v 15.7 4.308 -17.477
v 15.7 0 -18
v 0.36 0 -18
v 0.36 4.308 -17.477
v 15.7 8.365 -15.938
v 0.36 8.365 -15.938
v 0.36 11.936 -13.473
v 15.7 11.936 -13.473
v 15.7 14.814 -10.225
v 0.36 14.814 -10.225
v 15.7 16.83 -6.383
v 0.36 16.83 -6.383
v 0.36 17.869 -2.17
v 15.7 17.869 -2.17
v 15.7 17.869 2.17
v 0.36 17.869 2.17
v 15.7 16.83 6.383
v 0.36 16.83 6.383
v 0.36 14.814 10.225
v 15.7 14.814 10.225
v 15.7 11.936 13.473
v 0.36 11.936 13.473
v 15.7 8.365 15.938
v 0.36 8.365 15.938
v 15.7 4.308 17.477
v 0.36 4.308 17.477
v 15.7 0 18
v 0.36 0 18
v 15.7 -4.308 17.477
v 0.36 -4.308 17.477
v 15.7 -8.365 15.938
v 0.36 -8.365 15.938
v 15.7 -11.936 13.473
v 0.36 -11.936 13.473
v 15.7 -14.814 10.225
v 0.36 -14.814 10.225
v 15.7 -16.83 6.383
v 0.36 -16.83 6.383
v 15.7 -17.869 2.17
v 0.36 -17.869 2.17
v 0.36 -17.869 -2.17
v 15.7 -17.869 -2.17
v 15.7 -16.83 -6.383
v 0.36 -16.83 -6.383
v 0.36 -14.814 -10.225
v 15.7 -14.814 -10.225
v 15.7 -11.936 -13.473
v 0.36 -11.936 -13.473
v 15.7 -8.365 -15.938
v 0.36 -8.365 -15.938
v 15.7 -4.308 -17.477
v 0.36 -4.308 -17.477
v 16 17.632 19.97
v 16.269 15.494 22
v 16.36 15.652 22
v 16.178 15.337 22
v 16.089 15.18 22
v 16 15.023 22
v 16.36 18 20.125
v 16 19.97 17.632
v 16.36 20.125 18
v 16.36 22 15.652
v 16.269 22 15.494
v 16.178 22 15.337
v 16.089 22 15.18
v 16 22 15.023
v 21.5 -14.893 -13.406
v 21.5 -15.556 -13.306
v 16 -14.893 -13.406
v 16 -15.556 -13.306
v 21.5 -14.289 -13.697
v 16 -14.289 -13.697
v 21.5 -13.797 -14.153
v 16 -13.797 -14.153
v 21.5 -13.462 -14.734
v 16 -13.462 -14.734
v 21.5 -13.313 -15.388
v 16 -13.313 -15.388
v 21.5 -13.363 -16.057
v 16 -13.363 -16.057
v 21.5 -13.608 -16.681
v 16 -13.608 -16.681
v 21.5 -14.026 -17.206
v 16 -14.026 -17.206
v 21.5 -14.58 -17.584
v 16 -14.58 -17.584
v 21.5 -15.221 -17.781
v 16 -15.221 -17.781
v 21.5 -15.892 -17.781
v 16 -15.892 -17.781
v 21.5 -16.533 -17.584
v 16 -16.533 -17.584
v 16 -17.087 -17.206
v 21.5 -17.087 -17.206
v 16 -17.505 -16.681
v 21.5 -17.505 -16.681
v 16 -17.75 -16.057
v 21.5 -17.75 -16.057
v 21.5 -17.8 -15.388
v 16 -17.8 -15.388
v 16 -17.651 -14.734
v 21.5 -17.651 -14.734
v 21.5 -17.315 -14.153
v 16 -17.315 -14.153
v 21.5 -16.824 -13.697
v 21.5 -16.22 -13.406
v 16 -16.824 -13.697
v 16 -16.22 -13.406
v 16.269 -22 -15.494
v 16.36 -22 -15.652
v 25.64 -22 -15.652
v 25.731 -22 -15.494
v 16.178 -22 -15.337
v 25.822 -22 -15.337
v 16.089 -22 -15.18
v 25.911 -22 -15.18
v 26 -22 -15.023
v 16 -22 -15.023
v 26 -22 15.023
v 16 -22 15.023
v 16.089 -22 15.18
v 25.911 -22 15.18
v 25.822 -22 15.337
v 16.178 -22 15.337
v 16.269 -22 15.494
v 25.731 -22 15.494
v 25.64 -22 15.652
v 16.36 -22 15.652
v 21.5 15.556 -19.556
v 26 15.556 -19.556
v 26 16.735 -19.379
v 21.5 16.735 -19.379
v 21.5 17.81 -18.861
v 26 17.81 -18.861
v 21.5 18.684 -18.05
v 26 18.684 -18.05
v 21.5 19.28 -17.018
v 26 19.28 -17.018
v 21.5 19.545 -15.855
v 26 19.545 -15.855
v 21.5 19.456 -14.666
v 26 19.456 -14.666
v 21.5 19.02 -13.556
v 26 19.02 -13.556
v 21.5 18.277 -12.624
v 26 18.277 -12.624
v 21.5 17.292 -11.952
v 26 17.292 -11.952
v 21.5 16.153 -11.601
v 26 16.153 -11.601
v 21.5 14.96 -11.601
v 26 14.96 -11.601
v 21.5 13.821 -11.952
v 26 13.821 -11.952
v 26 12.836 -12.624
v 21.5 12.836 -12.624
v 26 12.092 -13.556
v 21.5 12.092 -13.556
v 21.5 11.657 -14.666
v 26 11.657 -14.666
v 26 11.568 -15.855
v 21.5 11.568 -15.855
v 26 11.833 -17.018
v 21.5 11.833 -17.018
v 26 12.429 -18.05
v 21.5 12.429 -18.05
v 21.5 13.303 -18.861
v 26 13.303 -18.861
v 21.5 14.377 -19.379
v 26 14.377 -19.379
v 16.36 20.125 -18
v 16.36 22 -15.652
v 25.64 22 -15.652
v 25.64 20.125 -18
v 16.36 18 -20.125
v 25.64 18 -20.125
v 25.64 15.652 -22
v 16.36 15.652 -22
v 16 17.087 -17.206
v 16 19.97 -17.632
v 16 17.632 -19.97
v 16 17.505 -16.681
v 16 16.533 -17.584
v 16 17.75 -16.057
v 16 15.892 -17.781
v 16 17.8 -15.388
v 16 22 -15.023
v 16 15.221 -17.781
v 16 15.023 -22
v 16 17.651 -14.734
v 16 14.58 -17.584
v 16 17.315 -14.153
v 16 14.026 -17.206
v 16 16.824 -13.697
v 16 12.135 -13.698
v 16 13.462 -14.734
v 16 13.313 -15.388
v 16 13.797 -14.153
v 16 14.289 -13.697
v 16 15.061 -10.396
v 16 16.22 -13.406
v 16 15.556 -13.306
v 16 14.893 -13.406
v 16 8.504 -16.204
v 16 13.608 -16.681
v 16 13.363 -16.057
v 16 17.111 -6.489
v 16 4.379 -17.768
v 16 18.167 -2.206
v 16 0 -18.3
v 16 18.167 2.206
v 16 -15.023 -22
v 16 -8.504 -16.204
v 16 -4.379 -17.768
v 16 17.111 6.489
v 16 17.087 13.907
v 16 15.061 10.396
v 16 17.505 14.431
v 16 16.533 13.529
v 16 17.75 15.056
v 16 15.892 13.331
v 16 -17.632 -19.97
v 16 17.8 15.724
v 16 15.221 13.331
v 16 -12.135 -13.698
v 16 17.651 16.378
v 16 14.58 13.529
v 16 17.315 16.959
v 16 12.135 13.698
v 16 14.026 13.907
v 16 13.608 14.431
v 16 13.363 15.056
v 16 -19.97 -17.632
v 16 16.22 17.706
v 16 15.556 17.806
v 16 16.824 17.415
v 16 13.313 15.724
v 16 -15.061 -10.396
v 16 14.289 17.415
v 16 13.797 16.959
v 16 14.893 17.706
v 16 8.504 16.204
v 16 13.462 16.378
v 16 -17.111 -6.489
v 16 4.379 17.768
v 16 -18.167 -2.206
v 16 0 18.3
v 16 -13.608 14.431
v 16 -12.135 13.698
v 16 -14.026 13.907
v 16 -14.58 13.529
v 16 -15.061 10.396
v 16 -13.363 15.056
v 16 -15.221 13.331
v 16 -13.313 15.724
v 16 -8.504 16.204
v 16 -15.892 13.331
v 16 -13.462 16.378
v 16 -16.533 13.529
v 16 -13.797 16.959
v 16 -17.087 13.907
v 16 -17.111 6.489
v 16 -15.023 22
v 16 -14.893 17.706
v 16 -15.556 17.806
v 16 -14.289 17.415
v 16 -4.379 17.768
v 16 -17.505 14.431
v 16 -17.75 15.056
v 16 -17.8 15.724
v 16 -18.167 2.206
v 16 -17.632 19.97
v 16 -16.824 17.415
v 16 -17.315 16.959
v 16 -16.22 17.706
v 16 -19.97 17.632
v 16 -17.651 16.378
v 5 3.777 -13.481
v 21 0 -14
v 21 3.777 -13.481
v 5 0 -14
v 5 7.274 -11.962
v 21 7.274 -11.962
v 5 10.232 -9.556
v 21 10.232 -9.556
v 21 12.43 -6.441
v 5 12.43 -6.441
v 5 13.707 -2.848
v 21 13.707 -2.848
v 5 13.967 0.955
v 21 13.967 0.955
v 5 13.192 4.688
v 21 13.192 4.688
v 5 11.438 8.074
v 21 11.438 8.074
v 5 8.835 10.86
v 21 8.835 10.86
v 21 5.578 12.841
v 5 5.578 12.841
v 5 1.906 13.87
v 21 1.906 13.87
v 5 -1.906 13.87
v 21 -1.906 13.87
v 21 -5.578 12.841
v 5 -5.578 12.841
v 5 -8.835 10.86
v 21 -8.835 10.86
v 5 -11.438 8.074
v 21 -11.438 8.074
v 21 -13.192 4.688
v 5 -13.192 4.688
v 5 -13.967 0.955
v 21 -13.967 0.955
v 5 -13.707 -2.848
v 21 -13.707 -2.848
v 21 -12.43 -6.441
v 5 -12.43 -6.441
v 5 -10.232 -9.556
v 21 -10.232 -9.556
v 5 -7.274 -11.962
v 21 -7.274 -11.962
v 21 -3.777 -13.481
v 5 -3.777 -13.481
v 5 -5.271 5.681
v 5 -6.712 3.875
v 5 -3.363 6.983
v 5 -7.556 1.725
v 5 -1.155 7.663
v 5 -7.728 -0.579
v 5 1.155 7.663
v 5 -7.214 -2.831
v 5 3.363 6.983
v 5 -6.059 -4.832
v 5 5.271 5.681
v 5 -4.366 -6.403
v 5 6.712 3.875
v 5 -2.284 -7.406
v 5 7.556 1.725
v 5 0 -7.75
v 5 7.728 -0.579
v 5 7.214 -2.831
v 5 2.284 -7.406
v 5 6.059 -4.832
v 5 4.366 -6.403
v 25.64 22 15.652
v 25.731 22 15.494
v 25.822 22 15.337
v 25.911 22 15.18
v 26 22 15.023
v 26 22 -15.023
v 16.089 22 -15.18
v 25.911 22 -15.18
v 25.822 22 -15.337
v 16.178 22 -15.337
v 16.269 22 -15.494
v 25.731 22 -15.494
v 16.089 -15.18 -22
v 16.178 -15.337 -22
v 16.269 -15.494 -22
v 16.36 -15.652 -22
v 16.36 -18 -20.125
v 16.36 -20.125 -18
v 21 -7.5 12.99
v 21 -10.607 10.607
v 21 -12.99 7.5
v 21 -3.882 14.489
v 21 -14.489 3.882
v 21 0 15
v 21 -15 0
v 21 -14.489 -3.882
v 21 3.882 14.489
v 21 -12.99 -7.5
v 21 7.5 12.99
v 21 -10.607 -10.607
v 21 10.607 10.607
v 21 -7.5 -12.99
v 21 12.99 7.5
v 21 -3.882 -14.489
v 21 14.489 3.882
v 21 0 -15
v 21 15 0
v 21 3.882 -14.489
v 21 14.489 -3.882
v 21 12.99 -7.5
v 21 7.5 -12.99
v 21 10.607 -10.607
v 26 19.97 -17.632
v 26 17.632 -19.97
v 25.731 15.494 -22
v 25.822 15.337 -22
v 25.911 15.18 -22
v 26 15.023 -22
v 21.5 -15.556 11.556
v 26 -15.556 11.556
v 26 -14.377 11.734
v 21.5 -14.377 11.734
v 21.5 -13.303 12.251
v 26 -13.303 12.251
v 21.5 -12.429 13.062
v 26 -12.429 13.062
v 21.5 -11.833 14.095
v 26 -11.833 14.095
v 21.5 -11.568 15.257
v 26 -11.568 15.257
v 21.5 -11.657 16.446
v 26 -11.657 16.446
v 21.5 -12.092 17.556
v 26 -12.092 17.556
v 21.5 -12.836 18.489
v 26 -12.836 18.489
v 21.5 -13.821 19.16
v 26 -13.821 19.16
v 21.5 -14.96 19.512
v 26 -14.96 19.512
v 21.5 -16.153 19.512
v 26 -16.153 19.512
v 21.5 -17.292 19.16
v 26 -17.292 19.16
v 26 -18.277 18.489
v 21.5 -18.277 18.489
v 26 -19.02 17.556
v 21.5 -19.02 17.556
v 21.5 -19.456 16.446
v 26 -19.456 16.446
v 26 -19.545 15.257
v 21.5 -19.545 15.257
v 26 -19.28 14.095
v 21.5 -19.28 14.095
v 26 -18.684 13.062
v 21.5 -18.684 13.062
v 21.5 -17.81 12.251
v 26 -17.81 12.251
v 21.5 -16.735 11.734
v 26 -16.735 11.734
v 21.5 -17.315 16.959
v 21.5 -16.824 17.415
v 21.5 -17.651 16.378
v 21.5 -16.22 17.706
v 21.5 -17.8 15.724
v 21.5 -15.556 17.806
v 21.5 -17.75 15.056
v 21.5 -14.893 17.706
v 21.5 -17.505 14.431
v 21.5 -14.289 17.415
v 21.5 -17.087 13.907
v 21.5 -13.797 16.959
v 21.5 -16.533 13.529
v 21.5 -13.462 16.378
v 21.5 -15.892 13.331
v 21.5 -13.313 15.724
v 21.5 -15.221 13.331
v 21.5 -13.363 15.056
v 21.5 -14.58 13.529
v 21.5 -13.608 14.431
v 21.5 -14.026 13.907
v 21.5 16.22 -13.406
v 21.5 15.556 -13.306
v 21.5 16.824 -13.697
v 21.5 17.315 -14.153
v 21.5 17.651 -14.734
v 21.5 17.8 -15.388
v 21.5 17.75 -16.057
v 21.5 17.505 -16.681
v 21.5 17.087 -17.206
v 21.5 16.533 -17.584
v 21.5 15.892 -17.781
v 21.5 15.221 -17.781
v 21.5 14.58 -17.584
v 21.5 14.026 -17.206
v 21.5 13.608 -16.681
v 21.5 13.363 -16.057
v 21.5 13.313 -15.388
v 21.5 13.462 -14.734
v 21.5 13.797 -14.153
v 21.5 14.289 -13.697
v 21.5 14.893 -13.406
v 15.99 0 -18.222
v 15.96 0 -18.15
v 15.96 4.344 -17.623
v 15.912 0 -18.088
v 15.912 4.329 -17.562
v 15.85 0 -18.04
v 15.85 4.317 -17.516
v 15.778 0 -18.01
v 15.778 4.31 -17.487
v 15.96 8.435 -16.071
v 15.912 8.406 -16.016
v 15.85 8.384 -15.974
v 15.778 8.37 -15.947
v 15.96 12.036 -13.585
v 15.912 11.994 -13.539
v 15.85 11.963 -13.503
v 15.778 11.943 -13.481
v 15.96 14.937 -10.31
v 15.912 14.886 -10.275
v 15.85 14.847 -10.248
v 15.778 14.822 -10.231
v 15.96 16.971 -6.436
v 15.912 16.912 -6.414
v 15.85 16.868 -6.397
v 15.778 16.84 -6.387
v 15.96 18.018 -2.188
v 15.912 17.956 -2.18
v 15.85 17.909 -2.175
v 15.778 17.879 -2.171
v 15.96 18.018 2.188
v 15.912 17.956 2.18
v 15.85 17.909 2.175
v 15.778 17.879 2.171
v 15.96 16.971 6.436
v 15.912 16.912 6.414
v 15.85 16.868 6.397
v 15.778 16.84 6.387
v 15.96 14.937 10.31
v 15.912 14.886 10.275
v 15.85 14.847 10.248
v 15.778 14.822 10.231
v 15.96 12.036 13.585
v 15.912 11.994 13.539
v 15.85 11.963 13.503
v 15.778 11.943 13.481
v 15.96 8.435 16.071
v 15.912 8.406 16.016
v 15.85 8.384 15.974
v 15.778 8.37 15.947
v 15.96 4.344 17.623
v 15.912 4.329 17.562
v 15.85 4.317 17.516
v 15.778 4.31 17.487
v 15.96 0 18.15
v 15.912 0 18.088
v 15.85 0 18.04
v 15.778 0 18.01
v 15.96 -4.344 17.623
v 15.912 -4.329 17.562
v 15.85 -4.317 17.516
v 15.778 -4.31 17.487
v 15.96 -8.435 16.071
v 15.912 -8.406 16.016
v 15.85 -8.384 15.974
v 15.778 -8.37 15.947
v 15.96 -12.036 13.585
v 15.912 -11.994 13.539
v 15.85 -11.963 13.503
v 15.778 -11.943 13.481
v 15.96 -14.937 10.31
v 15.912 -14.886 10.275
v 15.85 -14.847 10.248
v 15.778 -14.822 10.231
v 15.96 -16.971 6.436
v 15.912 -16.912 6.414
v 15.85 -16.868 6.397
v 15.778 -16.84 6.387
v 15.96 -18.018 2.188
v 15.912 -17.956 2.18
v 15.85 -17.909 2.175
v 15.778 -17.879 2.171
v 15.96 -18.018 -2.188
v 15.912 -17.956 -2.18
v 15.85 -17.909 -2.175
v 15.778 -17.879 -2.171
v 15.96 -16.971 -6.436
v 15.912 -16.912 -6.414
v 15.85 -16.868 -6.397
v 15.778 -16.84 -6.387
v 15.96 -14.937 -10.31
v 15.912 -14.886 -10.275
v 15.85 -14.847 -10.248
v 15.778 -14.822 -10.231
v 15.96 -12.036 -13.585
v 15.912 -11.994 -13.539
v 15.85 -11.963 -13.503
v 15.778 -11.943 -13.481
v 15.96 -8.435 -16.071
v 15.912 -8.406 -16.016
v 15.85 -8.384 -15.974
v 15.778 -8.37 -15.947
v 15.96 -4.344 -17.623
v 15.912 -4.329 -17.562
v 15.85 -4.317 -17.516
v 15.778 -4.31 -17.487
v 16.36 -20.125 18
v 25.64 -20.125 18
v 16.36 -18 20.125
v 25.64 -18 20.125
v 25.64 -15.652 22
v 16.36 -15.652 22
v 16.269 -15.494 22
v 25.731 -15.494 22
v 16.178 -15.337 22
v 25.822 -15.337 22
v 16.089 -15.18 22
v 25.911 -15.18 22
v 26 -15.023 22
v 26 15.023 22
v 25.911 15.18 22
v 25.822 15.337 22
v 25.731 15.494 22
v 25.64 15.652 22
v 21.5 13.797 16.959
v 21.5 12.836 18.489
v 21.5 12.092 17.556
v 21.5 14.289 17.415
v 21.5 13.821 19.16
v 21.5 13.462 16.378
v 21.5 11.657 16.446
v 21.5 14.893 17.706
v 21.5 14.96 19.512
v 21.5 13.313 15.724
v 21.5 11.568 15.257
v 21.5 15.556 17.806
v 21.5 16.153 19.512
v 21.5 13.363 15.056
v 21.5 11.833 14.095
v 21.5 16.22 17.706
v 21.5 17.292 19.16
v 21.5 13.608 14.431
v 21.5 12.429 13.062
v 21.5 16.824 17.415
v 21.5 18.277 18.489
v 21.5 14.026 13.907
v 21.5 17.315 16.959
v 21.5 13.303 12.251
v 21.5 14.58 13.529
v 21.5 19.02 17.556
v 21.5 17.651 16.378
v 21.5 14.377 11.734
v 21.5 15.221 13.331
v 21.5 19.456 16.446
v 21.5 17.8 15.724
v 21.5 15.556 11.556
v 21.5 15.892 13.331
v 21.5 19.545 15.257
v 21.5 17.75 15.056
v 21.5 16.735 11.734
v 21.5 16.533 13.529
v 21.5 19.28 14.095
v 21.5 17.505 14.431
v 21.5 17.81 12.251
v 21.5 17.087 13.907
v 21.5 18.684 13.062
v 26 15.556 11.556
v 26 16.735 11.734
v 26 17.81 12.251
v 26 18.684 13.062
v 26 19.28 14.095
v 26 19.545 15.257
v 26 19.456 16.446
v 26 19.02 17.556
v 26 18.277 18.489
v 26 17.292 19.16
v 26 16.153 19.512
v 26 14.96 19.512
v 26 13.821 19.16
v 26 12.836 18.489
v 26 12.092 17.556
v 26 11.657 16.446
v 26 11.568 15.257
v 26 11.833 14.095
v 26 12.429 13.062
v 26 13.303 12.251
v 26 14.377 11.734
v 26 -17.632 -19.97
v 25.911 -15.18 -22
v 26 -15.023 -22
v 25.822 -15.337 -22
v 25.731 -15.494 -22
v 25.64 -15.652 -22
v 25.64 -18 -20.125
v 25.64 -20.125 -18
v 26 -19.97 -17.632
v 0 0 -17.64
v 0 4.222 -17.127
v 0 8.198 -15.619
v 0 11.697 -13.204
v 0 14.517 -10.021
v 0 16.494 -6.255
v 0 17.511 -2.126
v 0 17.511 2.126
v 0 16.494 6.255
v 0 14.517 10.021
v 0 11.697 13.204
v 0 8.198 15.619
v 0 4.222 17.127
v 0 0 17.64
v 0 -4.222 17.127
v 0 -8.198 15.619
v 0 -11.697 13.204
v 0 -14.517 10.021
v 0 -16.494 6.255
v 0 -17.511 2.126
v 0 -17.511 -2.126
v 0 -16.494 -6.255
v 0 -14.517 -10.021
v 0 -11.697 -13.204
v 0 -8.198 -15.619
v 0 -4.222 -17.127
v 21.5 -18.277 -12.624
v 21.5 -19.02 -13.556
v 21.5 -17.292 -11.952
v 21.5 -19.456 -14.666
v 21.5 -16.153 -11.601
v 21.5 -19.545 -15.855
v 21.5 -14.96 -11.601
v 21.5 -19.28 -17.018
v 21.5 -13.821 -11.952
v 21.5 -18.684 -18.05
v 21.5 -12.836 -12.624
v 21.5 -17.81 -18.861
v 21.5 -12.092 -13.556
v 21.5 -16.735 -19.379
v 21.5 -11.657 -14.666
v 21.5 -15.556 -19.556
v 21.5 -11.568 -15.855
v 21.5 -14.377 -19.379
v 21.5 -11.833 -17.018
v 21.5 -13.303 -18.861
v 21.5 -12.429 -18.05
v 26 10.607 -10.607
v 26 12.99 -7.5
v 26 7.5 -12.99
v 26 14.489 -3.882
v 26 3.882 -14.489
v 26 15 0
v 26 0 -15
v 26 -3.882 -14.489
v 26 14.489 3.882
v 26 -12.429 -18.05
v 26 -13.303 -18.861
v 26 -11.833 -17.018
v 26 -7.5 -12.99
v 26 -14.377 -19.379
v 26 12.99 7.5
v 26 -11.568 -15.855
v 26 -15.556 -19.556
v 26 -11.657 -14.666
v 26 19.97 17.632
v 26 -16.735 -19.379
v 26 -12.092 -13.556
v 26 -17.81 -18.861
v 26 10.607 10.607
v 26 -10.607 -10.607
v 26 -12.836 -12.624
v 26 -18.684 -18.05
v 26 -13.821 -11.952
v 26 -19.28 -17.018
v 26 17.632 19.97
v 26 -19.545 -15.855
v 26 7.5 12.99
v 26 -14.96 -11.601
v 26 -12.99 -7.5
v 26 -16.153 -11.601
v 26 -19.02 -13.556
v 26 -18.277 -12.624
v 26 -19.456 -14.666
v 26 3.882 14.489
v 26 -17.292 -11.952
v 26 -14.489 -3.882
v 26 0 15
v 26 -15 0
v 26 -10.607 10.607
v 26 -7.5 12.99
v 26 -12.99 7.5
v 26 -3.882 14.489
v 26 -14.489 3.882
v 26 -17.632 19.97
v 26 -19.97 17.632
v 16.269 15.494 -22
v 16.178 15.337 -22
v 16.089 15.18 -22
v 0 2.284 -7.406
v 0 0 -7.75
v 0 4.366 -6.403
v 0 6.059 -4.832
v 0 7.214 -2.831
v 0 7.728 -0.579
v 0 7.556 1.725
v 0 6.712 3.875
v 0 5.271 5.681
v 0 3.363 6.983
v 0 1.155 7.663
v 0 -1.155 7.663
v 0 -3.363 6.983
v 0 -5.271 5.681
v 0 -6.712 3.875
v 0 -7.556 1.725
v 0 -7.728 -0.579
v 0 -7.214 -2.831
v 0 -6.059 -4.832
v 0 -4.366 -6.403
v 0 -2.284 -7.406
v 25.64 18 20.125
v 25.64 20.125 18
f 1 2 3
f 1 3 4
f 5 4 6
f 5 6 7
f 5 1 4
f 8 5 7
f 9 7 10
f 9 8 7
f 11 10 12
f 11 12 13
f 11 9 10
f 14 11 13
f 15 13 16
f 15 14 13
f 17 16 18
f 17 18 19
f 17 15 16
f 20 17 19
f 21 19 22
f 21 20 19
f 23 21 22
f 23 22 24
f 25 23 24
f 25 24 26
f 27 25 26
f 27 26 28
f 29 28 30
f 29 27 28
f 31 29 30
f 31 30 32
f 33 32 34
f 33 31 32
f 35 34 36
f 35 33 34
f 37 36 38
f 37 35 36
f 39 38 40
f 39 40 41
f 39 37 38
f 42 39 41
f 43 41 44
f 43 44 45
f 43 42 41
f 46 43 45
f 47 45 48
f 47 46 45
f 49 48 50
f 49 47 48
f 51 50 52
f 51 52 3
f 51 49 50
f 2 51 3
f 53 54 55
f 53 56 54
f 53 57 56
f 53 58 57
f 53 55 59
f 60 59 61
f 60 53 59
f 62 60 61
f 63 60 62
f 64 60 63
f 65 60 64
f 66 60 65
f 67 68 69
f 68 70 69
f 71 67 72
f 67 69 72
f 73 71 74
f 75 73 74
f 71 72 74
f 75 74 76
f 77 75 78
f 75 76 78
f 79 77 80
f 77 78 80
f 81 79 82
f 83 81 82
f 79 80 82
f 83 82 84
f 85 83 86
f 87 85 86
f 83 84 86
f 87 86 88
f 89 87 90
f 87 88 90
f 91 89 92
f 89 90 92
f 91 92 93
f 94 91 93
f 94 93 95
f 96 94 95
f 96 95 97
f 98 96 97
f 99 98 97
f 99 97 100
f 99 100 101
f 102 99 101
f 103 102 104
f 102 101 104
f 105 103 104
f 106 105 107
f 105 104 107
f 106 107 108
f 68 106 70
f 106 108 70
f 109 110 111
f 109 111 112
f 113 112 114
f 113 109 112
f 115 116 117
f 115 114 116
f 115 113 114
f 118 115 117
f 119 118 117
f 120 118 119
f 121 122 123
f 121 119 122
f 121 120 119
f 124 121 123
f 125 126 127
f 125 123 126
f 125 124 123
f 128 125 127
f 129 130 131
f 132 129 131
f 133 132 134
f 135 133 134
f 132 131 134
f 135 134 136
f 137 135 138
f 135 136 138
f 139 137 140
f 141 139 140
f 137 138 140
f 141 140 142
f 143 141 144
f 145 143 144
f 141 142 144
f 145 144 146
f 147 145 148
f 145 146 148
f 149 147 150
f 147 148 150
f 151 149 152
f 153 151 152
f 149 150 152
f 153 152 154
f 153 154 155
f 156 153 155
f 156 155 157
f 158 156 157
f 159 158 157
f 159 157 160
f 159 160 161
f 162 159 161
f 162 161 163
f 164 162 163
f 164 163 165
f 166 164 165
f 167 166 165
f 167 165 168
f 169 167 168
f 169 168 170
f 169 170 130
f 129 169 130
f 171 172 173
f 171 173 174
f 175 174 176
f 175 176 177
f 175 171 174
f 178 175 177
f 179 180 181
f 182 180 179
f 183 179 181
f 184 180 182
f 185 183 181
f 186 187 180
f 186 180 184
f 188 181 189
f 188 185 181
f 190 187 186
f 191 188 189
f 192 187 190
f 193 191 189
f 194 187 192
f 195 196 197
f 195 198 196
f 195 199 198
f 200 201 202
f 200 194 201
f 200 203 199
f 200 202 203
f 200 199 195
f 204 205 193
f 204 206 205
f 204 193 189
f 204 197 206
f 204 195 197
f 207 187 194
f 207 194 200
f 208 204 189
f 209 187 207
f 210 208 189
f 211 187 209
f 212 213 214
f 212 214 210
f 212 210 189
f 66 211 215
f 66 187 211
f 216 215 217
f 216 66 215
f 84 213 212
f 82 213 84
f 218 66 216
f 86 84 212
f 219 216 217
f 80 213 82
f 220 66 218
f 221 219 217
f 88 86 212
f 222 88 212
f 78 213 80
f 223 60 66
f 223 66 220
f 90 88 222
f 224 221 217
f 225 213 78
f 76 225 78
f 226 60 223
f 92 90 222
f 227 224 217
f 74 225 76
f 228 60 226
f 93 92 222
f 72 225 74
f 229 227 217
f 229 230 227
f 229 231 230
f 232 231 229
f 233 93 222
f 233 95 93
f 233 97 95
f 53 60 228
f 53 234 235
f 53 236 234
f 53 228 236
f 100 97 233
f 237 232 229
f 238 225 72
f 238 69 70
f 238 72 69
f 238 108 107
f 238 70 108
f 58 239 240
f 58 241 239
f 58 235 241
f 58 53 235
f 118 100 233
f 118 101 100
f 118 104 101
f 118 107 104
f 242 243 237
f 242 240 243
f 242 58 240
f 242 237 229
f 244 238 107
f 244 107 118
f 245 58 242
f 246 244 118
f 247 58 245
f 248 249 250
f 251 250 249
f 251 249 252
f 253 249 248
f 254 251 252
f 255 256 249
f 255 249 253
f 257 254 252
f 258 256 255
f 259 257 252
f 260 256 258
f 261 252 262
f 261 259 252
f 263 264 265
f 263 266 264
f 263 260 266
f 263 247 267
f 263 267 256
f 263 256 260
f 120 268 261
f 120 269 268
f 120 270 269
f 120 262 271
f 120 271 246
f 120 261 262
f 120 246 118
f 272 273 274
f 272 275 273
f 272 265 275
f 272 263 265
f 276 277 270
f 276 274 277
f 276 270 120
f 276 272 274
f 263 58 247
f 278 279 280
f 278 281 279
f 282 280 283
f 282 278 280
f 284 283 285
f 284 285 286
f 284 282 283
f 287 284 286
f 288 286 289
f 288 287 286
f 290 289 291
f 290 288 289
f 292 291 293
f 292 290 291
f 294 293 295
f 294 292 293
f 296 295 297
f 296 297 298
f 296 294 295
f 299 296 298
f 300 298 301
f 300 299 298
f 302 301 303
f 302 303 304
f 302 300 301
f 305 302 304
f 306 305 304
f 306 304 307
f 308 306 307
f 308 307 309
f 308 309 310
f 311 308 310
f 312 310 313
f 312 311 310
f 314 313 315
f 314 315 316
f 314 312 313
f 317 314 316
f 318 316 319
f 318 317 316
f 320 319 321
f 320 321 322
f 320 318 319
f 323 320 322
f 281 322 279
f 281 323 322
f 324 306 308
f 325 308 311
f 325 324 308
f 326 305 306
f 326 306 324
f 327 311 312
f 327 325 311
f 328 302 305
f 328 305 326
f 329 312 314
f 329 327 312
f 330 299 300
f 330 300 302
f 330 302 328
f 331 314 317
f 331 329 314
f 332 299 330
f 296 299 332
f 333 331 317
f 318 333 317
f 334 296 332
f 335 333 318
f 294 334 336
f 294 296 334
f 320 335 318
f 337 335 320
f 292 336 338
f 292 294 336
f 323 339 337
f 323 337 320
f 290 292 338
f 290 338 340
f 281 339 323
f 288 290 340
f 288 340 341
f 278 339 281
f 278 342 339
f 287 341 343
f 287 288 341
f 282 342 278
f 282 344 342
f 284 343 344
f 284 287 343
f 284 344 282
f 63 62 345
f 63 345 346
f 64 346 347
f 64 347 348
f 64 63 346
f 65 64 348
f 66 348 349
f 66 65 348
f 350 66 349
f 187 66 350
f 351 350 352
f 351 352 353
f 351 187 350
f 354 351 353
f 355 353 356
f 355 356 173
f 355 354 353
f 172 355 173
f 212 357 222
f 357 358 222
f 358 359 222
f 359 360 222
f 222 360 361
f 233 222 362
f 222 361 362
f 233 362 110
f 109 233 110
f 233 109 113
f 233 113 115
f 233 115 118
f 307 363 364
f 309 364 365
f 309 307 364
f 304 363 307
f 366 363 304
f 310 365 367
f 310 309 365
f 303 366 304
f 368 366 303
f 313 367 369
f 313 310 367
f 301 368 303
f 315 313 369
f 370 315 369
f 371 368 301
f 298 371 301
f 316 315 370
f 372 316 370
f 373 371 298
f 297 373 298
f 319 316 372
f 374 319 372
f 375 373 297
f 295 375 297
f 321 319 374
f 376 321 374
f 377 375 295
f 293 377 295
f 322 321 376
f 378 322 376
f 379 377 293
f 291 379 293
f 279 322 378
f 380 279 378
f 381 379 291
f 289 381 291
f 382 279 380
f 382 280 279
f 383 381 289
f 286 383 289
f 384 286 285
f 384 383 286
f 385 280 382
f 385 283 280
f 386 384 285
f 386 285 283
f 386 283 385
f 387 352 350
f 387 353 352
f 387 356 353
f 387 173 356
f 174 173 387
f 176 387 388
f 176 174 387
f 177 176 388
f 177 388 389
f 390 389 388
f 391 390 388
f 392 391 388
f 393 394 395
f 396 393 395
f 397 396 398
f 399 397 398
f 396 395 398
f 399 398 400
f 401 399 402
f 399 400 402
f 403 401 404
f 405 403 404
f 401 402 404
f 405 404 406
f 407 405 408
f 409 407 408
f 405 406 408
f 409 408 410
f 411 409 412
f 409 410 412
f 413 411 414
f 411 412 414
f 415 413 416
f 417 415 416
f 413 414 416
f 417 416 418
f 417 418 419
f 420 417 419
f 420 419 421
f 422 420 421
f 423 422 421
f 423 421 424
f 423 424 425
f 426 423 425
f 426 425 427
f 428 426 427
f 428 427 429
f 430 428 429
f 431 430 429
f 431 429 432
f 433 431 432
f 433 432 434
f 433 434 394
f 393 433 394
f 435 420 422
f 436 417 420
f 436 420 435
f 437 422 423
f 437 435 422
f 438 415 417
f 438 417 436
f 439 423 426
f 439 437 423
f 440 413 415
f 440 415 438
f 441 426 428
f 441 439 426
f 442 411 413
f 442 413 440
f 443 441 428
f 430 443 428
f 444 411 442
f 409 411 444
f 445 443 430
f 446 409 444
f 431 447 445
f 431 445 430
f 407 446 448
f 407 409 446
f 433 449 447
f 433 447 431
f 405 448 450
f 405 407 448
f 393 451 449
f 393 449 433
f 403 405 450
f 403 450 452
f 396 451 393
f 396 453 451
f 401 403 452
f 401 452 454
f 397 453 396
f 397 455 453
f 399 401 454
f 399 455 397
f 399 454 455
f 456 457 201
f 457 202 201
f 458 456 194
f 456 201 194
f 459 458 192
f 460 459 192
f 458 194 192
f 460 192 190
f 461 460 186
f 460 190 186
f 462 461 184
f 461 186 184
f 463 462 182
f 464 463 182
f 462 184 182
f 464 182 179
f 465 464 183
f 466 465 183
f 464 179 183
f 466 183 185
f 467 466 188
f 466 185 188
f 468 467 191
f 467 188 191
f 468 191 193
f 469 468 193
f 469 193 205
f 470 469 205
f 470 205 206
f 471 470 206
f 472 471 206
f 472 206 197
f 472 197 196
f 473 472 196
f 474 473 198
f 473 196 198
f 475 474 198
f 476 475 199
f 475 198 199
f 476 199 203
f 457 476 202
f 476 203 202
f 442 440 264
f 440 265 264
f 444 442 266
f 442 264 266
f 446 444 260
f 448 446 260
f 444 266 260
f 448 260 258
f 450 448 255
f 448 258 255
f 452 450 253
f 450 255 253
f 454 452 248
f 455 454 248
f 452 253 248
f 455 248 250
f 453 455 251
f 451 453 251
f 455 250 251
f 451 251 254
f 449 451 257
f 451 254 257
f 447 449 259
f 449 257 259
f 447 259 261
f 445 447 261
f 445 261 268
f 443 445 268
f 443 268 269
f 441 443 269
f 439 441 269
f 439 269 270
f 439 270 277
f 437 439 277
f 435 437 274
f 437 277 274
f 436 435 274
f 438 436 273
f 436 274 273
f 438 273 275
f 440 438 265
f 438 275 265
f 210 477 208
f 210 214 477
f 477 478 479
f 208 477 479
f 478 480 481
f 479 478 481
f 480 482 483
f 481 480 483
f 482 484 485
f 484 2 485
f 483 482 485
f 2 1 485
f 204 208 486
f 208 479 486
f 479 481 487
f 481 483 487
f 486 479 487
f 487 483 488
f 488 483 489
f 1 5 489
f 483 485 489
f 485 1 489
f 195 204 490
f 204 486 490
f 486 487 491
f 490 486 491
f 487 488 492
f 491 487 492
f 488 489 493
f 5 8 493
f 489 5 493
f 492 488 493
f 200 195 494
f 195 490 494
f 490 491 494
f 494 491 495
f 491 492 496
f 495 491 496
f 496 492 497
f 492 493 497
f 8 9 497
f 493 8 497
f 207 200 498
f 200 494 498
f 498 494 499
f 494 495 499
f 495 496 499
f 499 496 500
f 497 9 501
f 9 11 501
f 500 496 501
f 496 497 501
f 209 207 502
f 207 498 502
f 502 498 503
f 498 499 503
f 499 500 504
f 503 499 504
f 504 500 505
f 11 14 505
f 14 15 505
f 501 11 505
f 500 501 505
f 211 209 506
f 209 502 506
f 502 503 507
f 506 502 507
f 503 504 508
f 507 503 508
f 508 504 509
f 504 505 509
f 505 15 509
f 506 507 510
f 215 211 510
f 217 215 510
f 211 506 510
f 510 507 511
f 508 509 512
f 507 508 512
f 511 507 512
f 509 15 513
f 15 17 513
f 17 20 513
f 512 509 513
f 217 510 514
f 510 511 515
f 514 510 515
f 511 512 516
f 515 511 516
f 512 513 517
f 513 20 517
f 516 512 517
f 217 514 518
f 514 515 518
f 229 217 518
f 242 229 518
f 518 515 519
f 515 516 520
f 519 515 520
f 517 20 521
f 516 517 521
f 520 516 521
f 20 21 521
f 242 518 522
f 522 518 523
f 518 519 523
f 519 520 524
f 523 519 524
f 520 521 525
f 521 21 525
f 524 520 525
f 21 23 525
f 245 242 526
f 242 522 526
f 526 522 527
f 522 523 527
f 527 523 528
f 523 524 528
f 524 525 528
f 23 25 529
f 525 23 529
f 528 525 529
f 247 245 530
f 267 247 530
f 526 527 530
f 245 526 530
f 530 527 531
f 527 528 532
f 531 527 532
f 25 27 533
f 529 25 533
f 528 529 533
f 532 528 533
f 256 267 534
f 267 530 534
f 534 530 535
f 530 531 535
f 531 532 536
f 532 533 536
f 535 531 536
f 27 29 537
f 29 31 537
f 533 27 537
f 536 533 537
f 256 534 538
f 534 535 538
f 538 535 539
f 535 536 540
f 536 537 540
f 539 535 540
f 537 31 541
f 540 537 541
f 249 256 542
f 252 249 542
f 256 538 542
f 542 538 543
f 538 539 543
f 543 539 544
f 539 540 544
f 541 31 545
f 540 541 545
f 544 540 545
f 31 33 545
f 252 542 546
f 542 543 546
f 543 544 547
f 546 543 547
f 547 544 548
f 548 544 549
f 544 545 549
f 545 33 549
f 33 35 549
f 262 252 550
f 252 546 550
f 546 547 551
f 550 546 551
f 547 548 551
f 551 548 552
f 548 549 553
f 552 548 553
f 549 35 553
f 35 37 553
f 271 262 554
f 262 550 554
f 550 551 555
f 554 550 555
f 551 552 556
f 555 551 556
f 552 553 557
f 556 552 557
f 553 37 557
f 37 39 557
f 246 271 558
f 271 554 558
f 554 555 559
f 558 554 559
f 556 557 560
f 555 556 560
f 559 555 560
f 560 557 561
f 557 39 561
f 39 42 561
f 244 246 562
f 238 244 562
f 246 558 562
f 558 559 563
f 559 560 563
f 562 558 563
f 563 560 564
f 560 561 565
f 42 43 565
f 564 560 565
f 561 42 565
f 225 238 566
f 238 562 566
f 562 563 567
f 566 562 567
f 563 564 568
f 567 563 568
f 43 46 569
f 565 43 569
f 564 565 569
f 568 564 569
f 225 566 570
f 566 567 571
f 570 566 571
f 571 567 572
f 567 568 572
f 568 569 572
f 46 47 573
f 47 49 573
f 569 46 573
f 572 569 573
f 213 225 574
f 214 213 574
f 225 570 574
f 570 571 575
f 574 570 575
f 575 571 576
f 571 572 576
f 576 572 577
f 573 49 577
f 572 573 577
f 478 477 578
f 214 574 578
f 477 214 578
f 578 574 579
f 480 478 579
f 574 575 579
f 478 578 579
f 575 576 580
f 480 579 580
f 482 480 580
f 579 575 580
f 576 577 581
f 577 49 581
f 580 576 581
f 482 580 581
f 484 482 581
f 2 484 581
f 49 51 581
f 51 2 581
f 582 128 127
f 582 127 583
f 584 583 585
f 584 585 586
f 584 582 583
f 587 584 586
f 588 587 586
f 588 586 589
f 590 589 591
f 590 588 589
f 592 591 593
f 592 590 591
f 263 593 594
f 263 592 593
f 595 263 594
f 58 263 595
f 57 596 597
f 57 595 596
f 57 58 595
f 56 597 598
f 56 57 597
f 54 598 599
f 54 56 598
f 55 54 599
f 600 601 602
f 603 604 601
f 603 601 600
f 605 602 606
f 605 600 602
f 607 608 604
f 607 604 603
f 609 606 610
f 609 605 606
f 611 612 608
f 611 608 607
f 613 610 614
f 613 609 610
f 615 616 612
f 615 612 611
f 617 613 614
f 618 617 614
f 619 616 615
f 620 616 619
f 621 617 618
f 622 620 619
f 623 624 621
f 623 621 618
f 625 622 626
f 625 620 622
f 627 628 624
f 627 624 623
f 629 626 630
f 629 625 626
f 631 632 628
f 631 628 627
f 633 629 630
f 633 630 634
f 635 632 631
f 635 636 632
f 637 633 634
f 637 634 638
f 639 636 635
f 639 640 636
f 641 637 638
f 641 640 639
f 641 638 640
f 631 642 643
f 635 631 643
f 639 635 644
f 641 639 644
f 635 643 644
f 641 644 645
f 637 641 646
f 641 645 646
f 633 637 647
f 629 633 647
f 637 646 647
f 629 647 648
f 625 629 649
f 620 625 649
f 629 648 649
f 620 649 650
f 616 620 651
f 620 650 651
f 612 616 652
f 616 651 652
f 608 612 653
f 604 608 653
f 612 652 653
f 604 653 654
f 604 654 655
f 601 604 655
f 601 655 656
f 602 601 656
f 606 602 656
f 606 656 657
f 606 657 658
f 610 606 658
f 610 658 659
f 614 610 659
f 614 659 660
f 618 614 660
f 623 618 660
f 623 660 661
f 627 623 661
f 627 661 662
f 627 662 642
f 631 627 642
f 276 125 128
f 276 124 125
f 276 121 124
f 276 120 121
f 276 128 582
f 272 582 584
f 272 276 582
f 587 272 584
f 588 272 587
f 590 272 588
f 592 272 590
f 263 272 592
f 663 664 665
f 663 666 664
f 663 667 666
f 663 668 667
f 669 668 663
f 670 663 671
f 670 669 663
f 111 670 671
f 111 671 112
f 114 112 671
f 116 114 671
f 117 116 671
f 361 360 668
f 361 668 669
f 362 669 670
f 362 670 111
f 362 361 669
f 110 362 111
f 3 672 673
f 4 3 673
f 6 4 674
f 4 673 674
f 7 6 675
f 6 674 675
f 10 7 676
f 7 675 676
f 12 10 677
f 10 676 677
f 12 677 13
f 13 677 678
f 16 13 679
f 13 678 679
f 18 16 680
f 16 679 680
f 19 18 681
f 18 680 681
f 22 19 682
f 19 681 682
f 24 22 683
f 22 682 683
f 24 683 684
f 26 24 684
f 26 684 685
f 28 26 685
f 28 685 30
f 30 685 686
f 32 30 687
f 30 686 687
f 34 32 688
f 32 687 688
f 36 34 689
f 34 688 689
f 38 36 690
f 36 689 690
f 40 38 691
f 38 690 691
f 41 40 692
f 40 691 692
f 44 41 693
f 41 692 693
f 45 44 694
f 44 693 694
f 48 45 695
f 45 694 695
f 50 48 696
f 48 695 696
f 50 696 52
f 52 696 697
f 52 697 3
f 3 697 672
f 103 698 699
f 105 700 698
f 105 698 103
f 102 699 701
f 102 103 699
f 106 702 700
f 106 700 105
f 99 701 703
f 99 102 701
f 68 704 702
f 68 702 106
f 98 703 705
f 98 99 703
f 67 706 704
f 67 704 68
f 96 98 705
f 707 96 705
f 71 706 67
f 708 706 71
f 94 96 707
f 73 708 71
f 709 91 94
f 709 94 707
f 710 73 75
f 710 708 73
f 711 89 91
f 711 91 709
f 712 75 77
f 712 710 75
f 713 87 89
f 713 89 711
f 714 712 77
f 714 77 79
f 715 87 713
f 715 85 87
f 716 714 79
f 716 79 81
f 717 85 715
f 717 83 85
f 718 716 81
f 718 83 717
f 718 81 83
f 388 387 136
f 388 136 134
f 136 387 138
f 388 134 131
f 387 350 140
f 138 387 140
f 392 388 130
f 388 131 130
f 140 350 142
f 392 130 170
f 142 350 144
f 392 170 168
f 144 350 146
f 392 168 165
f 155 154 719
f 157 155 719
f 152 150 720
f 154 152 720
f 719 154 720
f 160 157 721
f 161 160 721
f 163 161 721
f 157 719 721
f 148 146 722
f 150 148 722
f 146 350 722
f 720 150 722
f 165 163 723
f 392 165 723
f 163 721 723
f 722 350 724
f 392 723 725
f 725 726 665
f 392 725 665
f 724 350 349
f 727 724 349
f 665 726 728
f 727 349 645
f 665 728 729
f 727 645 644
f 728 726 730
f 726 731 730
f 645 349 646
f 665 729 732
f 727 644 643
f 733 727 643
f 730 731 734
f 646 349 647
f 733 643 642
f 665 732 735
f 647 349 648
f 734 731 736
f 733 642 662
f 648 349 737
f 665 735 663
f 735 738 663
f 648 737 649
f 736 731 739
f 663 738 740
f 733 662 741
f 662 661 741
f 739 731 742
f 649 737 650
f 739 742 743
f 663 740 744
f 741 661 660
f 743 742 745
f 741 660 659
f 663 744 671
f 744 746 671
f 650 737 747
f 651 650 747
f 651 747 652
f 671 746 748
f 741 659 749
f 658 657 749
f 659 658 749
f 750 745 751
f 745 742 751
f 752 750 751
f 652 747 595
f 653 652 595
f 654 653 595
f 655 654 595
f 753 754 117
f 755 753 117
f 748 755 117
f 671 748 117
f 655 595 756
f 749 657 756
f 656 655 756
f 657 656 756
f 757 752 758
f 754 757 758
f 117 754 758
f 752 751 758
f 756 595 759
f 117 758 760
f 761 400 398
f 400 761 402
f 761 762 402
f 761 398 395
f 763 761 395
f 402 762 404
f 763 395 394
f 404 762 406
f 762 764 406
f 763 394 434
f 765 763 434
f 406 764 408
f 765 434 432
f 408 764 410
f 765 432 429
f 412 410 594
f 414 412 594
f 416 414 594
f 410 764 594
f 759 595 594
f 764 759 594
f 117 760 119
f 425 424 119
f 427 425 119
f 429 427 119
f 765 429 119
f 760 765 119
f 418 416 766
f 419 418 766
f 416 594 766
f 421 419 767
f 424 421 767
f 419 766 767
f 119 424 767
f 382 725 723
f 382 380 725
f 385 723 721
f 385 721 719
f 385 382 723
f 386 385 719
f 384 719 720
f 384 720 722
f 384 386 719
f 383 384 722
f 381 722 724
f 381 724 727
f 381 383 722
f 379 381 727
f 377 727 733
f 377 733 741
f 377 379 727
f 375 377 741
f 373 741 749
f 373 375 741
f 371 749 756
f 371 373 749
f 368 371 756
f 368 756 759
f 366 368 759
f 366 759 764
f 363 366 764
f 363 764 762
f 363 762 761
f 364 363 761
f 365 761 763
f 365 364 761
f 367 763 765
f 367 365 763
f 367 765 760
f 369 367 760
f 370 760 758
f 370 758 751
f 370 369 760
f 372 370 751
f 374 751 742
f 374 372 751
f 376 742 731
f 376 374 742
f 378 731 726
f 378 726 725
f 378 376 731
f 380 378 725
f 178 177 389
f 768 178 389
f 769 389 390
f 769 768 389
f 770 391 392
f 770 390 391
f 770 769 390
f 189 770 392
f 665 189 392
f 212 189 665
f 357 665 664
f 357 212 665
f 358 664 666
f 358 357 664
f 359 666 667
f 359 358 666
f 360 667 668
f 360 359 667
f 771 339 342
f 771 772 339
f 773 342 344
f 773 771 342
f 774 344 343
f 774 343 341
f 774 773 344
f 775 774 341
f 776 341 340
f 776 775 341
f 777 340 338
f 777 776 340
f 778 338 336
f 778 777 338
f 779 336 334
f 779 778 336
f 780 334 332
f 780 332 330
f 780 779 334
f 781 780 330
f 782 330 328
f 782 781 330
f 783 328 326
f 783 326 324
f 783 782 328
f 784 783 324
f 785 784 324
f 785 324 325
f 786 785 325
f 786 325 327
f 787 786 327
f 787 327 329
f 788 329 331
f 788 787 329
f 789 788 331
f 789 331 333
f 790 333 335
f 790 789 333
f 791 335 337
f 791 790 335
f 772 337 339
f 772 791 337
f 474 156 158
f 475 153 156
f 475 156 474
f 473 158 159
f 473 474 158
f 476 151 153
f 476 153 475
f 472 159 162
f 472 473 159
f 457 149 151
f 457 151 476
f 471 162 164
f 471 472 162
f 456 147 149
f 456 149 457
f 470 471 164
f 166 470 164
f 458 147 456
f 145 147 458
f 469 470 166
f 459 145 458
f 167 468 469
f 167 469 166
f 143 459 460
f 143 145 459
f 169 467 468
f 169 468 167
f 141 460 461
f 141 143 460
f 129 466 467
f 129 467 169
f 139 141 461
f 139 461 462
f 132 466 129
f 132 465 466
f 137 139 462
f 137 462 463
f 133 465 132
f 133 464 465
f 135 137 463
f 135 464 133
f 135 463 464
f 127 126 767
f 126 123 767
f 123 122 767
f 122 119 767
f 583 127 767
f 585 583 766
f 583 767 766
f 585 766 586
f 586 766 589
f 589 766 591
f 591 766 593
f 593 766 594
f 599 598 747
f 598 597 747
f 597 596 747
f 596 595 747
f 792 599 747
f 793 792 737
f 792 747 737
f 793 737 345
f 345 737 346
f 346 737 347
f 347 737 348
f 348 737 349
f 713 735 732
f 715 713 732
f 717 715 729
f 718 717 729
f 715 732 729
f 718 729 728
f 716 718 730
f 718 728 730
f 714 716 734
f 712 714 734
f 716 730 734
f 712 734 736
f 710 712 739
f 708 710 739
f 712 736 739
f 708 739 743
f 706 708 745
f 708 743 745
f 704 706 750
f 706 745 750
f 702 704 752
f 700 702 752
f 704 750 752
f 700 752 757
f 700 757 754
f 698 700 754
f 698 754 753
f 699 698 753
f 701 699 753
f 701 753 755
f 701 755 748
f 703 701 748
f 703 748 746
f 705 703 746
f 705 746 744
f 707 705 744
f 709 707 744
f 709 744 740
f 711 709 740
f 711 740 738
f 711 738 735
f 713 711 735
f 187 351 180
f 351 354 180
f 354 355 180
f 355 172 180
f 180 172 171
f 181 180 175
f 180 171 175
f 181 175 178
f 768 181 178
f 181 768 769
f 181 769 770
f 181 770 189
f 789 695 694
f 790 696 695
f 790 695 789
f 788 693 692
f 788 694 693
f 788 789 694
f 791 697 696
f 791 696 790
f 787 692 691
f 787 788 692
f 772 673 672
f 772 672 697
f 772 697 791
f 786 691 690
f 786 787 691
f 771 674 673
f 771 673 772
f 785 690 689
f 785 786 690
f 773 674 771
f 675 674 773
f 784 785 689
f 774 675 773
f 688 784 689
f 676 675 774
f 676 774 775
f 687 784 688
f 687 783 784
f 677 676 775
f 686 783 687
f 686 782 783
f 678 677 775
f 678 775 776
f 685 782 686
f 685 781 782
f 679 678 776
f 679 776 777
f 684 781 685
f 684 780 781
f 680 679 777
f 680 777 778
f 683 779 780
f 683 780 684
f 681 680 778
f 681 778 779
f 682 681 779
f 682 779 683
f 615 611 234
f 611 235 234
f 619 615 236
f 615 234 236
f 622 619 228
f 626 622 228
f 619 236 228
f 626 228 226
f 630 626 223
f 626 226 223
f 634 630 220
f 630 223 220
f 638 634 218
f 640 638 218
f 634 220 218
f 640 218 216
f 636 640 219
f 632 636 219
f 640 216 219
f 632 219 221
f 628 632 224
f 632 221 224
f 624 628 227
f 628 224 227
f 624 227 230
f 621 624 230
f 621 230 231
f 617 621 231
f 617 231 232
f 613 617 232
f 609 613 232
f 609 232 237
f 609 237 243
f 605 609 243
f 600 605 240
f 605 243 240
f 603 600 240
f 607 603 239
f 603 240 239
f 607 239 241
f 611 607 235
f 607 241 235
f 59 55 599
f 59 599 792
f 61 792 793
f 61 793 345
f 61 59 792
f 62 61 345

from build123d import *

# Parameters (mm, degrees)
BOSS_EXTRUDE1_DEPTH                              = 10
SKETCH2_W                                        = 16
SKETCH2_H                                        = 18
CBORE_FOR_M4_HEX_HEAD_MACHINE_SCREW1_D           = 4.5
CBORE_FOR_M4_HEX_HEAD_MACHINE_SCREW1_DEPTH       = 26
CBORE_FOR_M4_HEX_HEAD_MACHINE_SCREW1_CBORE_D     = 8
CBORE_FOR_M4_HEX_HEAD_MACHINE_SCREW1_CBORE_DEPTH = 4.5
CHAMFER1_SIZE                                    = 0.36
FILLET1_R                                        = 0.3


with BuildPart() as part:
    # Sketch1 → Boss-Extrude1 (new body)
    with BuildSketch(Plane(origin=(16, 0, 0), x_dir=(0, -1, 0), z_dir=(-1, 0, 0))):
        with BuildLine():
            Line((15.652475842, 22), (-15.652475842, 22))
            ThreePointArc((-15.652475842, 22), (-19.091883092, 19.091883092), (-22, 15.652475842))
            Line((-22, 15.652475842), (-22, -15.652475842))
            ThreePointArc((-22, -15.652475842), (-19.091883092, -19.091883092), (-15.652475842, -22))
            Line((-15.652475842, -22), (15.652475842, -22))
            ThreePointArc((15.652475842, -22), (19.091883092, -19.091883092), (22, -15.652475842))
            Line((22, -15.652475842), (22, 15.652475842))
            ThreePointArc((22, 15.652475842), (19.091883092, 19.091883092), (15.652475842, 22))
        make_face()
    extrude(amount=-BOSS_EXTRUDE1_DEPTH)

    # Sketch2 → Revolve1 (revolve)
    with BuildSketch(Plane.XY, mode=Mode.PRIVATE) as revolve1_sk:
        with Locations((8, 9)):
            Rectangle(SKETCH2_W, SKETCH2_H)
    revolve(revolve1_sk.sketch.rotate(Axis((0, 0, 0), (1, 0, 0)), 270), axis=Axis((0, 0, 0), (1, 0, 0)))

    # Sketch3 → Cut-Revolve1 (revolve, cut)
    with BuildSketch(Plane.XY, mode=Mode.PRIVATE) as cut_revolve1_sk:
        Polygon((0, 7.75), (0, 0), (26, 0), (26, 15), (21, 15), (21, 14), (5, 14), (5, 7.75), align=None)
    revolve(cut_revolve1_sk.sketch.rotate(Axis((0, 0, 0), (1, 0, 0)), 270), axis=Axis((0, 0, 0), (1, 0, 0)), mode=Mode.SUBTRACT)

    # CBORE for M4 Hex Head Machine Screw1
    with Locations(Plane(origin=(26, 0, 0), x_dir=(0, 0, -1), z_dir=(1, 0, 0))):
        with Locations((-15.556349186, -15.556349186), (15.556349186, 15.556349186), (15.556349186, -15.556349186), (-15.556349186, 15.556349186)):
            CounterBoreHole(CBORE_FOR_M4_HEX_HEAD_MACHINE_SCREW1_D / 2, CBORE_FOR_M4_HEX_HEAD_MACHINE_SCREW1_CBORE_D / 2, CBORE_FOR_M4_HEX_HEAD_MACHINE_SCREW1_CBORE_DEPTH, depth=CBORE_FOR_M4_HEX_HEAD_MACHINE_SCREW1_DEPTH)

    # Chamfer1
    chamfer1_edges = [part.edges().sort_by_distance(p)[0] for p in [
        (26, 19.091883092, 19.091883092),
        (16, -19.091883092, 19.091883092),
        (26, 19.091883092, -19.091883092),
        (26, -19.091883092, -19.091883092),
        (0, 0, 18),
        (26, -19.091883092, 19.091883092),
        (16, -19.091883092, -19.091883092),
        (16, 19.091883092, -19.091883092),
        (16, 19.091883092, 19.091883092),
    ]]
    chamfer(chamfer1_edges, length=CHAMFER1_SIZE)

    # Fillet1
    fillet1_edges = [part.edges().sort_by_distance(p)[0] for p in [
        (16, 0, 18),
    ]]
    fillet(fillet1_edges, radius=FILLET1_R)


solid = part.part
